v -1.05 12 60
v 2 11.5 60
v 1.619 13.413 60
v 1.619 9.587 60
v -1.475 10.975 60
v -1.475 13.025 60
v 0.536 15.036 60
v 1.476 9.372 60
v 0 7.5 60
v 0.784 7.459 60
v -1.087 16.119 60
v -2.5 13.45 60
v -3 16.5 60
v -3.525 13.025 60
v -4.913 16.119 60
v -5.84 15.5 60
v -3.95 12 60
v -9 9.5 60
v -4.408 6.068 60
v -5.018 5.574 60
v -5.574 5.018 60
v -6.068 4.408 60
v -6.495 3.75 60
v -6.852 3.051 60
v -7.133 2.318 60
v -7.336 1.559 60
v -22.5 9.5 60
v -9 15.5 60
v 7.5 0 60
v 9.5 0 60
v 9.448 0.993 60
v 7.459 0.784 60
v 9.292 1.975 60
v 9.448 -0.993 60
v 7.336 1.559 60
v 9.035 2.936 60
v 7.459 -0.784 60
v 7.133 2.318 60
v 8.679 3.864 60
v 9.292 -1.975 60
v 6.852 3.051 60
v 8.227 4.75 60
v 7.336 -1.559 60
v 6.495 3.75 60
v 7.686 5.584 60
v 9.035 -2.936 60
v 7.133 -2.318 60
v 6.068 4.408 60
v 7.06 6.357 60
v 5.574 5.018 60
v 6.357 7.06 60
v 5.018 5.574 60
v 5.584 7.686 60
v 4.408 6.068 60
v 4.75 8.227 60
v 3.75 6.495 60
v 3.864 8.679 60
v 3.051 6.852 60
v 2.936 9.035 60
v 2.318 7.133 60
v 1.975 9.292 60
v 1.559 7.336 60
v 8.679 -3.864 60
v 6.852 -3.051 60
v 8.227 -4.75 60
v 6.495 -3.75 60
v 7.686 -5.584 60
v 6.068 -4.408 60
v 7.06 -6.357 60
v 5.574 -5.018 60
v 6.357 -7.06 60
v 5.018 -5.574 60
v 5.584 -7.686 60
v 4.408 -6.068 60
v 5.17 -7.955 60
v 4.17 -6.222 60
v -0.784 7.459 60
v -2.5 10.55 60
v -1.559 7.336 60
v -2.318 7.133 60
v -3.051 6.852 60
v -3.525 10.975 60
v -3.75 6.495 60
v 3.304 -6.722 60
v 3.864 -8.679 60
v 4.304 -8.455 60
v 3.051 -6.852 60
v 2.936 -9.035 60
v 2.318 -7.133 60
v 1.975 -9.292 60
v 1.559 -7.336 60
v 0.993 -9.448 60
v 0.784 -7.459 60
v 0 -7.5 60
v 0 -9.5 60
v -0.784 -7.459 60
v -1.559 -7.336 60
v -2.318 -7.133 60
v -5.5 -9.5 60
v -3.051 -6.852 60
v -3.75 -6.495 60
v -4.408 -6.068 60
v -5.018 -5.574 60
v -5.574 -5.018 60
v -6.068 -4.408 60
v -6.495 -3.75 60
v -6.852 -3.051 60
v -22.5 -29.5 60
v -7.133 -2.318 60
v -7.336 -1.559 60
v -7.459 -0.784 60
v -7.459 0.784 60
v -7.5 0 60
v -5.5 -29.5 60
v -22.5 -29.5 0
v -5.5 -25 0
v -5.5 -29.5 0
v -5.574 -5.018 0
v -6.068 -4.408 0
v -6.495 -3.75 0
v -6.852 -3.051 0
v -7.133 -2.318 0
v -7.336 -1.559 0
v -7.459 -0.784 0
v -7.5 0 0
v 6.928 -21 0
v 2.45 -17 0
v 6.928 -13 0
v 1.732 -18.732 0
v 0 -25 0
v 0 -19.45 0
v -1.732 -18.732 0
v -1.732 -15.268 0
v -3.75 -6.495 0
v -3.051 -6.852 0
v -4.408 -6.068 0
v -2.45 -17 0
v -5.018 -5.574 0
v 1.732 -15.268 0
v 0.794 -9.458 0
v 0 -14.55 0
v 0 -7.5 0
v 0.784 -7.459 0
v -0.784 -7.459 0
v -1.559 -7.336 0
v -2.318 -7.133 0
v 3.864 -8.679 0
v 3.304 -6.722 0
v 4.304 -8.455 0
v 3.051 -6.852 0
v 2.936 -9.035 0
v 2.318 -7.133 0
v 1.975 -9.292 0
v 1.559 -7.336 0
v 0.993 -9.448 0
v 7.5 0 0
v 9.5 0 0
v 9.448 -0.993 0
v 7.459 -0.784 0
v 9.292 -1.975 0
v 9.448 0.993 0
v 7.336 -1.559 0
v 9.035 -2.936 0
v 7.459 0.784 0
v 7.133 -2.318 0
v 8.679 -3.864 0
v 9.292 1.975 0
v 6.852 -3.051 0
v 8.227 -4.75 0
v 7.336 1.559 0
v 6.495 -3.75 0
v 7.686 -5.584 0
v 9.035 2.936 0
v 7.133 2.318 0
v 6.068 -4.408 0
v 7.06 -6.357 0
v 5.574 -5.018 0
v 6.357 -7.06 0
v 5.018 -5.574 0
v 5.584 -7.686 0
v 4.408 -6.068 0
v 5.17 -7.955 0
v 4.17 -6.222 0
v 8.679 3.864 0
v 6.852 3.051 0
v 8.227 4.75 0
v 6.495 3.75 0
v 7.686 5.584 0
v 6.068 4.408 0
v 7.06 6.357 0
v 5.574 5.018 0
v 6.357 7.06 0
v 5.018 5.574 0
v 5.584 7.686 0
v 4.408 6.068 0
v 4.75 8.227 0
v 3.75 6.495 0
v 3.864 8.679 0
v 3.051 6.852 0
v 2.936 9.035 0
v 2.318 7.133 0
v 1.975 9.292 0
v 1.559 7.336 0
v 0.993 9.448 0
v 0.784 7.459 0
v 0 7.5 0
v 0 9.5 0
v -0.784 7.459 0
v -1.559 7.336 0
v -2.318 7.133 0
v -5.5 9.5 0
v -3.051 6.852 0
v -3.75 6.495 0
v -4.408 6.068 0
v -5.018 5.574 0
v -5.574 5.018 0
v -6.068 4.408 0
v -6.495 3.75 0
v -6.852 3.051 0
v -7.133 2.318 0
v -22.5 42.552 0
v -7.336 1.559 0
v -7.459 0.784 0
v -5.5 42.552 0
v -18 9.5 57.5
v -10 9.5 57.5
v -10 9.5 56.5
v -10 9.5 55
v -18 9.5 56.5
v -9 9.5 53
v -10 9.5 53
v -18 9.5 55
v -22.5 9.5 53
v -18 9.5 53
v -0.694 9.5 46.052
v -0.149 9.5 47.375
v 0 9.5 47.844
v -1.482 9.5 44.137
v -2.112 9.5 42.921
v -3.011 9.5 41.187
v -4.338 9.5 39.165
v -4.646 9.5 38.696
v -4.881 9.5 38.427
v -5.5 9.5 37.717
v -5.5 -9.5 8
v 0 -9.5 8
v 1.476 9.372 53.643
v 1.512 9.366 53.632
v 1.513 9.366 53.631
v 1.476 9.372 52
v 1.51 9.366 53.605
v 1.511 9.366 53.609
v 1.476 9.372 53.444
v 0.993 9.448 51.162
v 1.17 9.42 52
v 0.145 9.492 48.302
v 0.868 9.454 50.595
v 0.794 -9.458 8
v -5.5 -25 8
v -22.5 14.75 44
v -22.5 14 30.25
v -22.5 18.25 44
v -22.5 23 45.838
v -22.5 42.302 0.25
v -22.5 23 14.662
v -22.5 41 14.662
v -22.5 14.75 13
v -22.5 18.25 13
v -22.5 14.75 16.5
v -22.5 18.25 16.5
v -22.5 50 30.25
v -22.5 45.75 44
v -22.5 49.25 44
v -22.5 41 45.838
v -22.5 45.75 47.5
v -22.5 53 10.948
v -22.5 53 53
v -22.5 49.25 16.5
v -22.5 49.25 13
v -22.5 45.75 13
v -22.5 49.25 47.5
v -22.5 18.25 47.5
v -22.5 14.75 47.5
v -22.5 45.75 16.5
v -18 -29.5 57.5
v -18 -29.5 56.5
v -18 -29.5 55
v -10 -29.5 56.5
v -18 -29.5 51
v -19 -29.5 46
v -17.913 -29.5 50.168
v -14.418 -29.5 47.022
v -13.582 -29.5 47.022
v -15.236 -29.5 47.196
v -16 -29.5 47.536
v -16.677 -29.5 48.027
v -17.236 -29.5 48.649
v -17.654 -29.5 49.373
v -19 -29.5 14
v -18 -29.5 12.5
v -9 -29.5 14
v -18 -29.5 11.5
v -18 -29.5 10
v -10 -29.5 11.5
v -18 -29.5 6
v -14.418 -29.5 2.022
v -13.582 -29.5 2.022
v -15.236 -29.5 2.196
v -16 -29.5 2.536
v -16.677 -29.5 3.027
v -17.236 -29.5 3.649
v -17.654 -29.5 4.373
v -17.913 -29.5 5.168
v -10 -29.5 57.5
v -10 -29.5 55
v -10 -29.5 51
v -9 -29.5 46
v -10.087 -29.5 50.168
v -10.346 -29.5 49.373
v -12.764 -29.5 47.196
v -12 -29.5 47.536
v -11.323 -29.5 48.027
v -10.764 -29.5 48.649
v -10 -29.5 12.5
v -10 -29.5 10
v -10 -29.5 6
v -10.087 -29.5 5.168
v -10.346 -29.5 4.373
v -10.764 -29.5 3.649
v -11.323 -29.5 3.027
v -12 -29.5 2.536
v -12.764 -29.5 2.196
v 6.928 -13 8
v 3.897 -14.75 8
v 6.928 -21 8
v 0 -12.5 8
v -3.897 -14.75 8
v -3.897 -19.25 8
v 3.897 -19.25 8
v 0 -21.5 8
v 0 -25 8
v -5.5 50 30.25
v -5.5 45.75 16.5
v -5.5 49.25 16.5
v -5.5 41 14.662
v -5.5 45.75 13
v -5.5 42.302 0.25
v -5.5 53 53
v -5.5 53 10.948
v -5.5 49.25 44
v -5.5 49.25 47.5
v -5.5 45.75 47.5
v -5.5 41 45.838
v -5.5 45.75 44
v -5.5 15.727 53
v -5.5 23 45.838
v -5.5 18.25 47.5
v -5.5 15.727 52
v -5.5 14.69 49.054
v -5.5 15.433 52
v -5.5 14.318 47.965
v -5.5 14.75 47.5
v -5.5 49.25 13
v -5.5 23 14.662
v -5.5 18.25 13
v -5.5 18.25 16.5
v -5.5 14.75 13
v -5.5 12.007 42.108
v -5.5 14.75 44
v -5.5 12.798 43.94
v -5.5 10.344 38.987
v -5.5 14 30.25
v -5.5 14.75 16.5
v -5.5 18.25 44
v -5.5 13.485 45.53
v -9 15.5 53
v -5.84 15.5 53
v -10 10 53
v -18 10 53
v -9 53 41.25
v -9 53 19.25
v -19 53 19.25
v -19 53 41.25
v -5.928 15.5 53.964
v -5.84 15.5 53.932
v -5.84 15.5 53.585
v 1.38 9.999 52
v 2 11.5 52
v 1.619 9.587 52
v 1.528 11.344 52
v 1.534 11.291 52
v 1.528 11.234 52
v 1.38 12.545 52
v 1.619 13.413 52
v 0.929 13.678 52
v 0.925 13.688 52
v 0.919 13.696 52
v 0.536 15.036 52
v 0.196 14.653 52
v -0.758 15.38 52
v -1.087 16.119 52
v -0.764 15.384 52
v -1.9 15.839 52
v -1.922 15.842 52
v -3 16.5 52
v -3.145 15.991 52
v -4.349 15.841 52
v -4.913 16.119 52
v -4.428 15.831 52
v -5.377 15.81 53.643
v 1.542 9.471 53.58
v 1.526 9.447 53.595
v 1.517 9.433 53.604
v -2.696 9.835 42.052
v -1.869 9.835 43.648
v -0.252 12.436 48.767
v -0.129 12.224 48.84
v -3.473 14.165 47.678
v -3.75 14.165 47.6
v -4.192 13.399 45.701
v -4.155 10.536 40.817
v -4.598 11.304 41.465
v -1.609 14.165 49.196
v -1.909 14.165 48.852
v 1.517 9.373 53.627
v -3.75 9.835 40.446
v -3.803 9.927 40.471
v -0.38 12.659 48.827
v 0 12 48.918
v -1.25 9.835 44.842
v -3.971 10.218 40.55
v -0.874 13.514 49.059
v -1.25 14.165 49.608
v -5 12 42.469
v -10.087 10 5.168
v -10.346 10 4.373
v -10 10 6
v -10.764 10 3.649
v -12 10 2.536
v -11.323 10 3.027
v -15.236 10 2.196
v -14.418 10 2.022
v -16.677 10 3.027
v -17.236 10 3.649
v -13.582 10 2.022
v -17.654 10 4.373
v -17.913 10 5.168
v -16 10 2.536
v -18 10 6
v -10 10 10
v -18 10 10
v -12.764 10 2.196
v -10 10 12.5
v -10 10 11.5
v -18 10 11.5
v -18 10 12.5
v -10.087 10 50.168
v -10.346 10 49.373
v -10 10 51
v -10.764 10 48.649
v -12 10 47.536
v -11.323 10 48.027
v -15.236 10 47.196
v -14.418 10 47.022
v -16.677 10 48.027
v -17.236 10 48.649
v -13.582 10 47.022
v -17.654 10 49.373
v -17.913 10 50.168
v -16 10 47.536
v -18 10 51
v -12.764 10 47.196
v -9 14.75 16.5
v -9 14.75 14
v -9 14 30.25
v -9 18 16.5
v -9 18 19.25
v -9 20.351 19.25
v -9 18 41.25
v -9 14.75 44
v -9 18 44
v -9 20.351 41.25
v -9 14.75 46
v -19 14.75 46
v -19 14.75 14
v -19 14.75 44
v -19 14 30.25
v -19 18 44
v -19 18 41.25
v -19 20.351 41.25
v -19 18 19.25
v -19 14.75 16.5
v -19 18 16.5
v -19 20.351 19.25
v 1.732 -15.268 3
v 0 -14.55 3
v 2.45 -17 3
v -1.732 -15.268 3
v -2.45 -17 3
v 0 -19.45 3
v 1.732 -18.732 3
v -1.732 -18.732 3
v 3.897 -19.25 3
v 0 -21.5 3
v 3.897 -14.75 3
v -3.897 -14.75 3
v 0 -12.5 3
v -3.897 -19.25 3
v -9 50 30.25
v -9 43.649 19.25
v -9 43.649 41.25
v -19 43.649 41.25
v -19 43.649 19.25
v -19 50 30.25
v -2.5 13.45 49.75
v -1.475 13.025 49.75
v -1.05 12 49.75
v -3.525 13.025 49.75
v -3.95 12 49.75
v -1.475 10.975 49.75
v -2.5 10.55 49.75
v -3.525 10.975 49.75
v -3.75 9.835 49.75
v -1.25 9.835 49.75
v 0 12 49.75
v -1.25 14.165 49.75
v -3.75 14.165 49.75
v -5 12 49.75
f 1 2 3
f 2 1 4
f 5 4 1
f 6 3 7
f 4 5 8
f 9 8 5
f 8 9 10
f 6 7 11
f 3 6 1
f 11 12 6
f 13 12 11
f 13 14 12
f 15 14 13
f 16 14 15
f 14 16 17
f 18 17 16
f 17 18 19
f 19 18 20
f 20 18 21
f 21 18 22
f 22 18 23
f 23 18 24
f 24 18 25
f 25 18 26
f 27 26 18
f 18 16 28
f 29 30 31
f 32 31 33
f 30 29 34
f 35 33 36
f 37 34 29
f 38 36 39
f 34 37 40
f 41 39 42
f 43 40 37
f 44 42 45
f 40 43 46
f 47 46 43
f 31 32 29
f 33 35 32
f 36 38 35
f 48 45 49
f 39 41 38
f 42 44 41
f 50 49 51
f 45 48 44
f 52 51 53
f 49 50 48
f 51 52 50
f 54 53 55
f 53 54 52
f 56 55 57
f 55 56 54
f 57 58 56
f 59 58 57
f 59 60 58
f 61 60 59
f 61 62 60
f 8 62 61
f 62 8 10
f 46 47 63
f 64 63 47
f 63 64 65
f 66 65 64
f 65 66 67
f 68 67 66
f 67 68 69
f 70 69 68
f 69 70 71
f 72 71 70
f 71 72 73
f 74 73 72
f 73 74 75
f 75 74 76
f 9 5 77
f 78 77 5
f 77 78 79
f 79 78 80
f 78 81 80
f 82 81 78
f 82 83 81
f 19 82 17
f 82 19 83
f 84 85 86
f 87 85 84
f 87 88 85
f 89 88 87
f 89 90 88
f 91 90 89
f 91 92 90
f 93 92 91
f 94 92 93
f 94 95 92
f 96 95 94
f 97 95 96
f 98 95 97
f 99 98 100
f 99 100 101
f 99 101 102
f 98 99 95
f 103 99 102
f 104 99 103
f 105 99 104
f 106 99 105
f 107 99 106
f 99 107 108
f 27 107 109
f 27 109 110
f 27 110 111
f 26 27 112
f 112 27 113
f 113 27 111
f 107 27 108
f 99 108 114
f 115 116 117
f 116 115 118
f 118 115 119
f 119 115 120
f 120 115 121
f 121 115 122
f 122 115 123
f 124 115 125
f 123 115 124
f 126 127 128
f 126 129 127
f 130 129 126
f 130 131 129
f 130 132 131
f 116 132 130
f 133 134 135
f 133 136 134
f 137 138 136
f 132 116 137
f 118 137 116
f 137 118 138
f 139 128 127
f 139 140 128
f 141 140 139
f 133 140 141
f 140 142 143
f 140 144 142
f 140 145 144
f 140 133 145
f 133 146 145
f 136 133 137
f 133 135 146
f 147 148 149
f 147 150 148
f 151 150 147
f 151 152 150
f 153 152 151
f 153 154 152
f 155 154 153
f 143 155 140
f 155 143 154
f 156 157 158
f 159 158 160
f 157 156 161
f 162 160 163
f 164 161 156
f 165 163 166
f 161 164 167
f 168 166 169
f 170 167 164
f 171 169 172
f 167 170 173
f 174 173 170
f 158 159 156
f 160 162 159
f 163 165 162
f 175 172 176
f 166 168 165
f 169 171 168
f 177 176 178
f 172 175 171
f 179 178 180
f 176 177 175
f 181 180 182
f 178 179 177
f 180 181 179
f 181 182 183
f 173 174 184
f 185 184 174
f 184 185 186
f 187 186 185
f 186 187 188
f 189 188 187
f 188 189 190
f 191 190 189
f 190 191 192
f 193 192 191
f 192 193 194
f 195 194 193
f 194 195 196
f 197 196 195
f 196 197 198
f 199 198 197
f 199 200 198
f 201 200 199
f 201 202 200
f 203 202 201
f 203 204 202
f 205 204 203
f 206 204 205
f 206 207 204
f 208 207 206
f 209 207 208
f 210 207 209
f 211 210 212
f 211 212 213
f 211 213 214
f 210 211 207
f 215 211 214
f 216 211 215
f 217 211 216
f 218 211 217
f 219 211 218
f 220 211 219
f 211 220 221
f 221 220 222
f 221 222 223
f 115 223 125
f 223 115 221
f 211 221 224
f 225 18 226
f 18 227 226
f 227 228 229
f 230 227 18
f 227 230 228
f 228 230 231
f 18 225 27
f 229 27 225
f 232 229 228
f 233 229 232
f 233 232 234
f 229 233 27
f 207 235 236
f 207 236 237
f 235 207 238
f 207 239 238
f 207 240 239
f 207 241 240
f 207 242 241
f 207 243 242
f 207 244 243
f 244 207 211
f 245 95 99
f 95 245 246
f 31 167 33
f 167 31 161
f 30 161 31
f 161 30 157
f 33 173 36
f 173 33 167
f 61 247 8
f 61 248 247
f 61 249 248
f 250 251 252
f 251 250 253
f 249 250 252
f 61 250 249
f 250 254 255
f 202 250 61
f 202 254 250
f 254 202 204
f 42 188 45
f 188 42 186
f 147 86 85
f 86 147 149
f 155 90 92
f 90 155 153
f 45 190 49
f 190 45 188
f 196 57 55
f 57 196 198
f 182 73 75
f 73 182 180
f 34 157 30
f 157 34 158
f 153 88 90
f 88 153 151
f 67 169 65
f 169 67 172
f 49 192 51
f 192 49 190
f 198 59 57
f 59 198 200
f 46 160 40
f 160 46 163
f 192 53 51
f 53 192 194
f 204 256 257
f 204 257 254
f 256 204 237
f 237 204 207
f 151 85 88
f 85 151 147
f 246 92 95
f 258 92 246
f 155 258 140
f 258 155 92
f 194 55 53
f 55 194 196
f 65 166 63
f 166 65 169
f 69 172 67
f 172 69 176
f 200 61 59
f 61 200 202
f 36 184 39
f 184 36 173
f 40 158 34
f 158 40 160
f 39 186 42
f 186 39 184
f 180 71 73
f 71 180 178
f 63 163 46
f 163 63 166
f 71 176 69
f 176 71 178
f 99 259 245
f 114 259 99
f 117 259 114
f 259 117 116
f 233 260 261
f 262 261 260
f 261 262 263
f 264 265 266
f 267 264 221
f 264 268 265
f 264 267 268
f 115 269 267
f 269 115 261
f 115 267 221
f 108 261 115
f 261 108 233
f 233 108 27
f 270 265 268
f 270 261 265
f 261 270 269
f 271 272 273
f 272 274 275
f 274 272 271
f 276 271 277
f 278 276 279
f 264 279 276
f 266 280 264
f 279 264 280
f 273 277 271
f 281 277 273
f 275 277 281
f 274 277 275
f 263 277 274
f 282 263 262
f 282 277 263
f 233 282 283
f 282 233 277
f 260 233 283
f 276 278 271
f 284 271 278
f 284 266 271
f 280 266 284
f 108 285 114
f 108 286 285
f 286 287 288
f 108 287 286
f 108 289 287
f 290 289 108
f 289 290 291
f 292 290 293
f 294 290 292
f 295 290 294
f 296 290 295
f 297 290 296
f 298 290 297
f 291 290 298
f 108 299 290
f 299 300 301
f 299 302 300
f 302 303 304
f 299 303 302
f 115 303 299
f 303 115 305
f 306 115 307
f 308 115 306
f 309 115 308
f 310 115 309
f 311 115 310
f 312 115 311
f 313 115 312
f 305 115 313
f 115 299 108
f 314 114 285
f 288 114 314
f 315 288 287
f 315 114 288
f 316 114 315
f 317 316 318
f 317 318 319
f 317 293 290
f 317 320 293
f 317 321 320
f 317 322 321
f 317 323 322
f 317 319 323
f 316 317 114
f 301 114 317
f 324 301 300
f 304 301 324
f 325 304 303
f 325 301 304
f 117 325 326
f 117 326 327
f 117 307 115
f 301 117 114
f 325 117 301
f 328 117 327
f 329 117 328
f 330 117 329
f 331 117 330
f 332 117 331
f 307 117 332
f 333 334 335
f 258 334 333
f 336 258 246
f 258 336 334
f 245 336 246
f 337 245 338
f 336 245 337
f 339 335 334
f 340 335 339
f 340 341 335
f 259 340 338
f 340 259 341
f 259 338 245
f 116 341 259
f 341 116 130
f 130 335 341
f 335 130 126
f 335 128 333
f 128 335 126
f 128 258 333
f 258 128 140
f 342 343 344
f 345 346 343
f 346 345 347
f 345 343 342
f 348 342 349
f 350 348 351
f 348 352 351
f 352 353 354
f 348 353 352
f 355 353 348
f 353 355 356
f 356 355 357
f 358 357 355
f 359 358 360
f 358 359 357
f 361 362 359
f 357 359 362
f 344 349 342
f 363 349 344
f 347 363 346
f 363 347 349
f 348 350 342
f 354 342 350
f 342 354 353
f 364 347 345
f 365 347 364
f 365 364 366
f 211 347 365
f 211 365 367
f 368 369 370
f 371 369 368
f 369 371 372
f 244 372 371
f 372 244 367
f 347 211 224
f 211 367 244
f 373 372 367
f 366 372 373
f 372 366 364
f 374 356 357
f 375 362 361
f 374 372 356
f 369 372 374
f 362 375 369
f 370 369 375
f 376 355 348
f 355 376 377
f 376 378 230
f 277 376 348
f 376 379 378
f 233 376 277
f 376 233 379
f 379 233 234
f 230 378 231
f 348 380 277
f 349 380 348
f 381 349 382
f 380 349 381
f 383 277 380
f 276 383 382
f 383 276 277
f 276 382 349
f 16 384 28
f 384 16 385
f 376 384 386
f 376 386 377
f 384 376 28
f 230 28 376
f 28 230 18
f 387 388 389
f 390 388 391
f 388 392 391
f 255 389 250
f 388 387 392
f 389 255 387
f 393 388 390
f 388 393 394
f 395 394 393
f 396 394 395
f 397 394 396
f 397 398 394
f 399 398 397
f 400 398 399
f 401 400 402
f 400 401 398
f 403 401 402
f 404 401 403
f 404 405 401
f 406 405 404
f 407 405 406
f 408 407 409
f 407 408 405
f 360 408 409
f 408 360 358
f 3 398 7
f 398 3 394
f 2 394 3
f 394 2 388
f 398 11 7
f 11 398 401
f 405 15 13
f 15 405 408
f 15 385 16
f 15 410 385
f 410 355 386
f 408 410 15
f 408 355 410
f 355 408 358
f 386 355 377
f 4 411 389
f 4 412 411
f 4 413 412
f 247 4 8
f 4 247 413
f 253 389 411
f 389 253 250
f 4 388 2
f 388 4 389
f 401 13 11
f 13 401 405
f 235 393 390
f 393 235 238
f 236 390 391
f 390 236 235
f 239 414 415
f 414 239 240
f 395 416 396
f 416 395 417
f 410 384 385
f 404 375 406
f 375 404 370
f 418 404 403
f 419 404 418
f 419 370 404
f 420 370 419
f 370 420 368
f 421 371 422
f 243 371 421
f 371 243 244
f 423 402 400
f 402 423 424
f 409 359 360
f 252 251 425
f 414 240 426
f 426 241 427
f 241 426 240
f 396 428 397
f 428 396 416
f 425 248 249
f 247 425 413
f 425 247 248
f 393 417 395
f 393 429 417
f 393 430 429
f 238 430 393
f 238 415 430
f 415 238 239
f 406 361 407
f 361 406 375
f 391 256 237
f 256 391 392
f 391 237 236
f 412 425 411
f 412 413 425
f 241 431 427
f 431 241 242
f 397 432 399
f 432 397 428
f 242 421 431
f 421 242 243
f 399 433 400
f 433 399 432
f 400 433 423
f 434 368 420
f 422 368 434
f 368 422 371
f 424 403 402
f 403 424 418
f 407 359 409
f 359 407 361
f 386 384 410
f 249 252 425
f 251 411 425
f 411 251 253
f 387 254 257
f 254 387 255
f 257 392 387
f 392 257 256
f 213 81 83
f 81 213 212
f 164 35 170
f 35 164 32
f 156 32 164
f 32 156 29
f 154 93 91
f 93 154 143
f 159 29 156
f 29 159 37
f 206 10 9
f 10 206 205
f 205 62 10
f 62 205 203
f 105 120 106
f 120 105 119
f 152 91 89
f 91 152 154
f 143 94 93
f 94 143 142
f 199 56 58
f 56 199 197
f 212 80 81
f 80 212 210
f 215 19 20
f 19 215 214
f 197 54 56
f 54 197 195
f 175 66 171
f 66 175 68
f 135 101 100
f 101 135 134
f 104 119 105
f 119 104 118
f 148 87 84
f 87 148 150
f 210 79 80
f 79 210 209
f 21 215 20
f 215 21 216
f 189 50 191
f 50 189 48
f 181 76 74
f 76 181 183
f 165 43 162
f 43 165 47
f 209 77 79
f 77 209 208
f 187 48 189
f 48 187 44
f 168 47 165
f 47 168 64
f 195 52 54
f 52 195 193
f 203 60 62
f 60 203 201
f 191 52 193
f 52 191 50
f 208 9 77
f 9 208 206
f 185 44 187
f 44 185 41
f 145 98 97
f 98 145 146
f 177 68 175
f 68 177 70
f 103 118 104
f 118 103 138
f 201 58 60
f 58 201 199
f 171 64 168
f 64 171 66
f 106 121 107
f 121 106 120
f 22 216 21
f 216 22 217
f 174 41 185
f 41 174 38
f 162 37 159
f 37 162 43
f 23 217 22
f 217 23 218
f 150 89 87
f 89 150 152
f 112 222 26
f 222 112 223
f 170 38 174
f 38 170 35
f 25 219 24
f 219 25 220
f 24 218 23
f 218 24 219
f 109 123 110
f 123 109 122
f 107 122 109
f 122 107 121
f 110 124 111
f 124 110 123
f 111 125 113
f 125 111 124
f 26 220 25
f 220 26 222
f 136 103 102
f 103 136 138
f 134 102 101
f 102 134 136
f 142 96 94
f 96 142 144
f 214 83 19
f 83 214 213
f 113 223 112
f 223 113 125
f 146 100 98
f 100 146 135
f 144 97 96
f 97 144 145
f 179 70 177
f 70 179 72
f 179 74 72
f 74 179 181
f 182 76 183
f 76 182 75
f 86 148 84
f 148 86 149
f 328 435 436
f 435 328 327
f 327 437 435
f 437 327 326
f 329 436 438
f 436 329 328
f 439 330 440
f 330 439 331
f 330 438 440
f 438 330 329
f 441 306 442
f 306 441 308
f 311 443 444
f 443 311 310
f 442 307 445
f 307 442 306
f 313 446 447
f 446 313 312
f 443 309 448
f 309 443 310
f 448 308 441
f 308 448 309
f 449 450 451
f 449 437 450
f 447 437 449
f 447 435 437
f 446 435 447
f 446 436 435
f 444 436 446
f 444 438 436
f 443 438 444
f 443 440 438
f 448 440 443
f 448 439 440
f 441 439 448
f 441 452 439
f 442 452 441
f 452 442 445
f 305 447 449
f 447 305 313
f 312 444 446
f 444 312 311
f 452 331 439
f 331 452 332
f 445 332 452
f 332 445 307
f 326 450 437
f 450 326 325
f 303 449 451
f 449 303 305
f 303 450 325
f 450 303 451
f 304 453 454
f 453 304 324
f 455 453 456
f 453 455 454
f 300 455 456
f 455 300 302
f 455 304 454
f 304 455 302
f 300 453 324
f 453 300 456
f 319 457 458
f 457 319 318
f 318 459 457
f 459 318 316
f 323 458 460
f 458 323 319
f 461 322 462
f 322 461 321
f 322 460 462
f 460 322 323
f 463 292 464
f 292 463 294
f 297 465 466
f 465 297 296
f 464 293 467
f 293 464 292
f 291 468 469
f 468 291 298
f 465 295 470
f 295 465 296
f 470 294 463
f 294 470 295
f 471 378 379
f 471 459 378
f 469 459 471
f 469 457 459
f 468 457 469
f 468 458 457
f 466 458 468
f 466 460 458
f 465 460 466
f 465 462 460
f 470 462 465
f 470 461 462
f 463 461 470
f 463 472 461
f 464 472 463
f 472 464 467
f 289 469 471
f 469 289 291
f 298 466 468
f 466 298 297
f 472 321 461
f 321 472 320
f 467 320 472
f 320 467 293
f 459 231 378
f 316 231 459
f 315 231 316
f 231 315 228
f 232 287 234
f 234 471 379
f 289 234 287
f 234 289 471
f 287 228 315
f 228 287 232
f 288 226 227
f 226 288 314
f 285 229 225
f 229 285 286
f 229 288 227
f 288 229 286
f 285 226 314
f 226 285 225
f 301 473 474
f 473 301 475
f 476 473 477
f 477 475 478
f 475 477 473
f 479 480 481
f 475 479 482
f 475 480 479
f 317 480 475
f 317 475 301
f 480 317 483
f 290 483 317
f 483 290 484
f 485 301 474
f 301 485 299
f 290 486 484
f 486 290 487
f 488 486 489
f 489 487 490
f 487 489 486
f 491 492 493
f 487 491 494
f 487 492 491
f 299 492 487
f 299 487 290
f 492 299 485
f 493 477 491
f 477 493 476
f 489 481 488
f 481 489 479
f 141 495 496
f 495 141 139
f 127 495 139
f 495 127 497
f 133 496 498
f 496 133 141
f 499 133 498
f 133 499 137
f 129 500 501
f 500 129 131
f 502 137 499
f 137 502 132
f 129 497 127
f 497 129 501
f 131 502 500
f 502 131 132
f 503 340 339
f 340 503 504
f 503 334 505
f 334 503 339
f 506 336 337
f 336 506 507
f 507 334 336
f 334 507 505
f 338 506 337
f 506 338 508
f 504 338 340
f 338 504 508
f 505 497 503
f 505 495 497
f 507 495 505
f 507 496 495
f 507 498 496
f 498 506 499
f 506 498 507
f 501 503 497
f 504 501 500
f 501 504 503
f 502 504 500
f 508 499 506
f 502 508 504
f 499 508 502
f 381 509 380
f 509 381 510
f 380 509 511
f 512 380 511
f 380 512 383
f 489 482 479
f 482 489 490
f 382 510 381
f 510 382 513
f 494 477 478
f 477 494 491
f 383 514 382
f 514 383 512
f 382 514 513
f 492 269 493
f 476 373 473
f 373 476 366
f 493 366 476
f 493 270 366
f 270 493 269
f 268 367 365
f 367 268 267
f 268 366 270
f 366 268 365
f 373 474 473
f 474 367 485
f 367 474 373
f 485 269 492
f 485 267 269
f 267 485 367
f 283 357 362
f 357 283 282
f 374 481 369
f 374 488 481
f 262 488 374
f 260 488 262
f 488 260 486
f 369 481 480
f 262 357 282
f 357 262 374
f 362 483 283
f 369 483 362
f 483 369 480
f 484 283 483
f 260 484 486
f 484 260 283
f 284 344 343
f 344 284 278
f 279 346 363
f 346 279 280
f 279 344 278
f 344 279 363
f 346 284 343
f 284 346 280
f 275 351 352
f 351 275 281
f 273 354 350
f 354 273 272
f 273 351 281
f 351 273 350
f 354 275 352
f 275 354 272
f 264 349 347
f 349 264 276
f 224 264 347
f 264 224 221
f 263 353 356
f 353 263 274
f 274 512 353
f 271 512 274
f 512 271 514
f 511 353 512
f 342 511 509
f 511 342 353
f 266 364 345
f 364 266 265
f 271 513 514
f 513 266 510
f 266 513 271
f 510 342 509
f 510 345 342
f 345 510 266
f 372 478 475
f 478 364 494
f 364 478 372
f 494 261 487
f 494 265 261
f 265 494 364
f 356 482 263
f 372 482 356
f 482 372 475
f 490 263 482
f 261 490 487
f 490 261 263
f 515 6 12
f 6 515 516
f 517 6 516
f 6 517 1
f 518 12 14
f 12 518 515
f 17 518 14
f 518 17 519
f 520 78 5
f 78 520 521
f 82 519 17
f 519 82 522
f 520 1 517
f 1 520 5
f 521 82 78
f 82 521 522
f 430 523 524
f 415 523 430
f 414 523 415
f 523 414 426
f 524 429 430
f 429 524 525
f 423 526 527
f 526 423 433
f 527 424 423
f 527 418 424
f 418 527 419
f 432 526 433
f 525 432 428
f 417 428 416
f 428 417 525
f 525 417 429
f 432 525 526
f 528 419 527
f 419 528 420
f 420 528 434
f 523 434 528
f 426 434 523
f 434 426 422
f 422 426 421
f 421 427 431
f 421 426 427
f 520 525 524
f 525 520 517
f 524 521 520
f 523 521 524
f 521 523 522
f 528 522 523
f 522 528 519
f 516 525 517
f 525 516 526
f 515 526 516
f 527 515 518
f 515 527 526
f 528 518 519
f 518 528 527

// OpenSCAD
// file: bearing.scad
// PRUSA iteration3
// Bearing holders
// GNU GPL v3
// Josef Průša <iam@josefprusa.cz> and contributors
// http://www.reprap.org/wiki/Prusa_Mendel
// http://prusamendel.org

//LM8UU
bearing_diameter = 15;
bearing_long = 24;
bearing_in = 8;

module horizontal_bearing_base(bearings=1){
 translate(v=[0,0,6]) cube(size = [24,8+bearings*bearing_long,12], center = true);	
}
module horizontal_bearing_holes(bearings=1){
 cutter_lenght = 10+bearings*bearing_long;
 one_holder_lenght = 8+bearing_long;
 holder_lenght = 8+bearings*bearing_long;
 
 // Main bearing cut
 difference(){
  translate(v=[0,0,12]) rotate(a=[90,0,0]) translate(v=[0,0,-cutter_lenght/2]) cylinder(h = cutter_lenght, r=bearing_diameter/2, $fn=50);
  // Bearing retainers
  translate(v=[0,1-holder_lenght/2,3]) cube(size = [24,6,2+(bearing_diameter-bearing_in)/2], center = true);
  translate(v=[0,-1+holder_lenght/2,3]) cube(size = [24,6,2+(bearing_diameter-bearing_in)/2], center = true);
 }
 
 // Ziptie cutouts
 ziptie_cut_ofset = 0;
 for ( i = [0 : bearings-1] ){
  // For easier positioning I move them by half of one 
  // bearing holder then add each bearign lenght and then center again
  translate(v=[0,-holder_lenght/2,0]) translate(v=[0,one_holder_lenght/2+i*25,0]) difference(){
   union(){
    translate(v=[0,2-6,12]) rotate(a=[90,0,0]) translate(v=[0,0,0]) cylinder(h = 4, r=12.5, $fn=50);
    translate(v=[0,2+6,12]) rotate(a=[90,0,0]) translate(v=[0,0,0]) cylinder(h = 4, r=12.5, $fn=50);
   }
   translate(v=[0,10,12]) rotate(a=[90,0,0]) translate(v=[0,0,0]) cylinder(h = 24, r=10, $fn=50);
  }
 }
 
}

module horizontal_bearing_test(){
 difference(){
  horizontal_bearing_base(1);
  horizontal_bearing_holes(1);
 }
 translate(v=[30,0,0]) difference(){
  horizontal_bearing_base(2);
  horizontal_bearing_holes(2);
 }
 translate(v=[60,0,0]) difference(){
  horizontal_bearing_base(3);
  horizontal_bearing_holes(3);
 }
}



thinwall = 2;
bearing_size = bearing_diameter + 2 * thinwall;

module vertical_bearing_base(){
 translate(v=[-2-bearing_size/4,0,30]) cube(size = [4+bearing_size/2,bearing_size,60], center = true);
 cylinder(h = 60, r=bearing_size/2, $fn = 60);
}

module vertical_bearing_holes(){
  translate(v=[0,0,-1]) cylinder(h = 62, r=bearing_diameter/2, $fn = 60);
  rotate(a=[0,0,-60]) translate(v=[10,0,31]) cube(size = [10,1,62], center = true);
}

difference(){
vertical_bearing_base();
vertical_bearing_holes();
}
// file: configuration.scad
x_rod_distance = 45;

// Select your belt type ******************************************************

//GT2
belt_tooth_distance = 2;
belt_tooth_ratio = 0.64;

//T2.5
//belt_tooth_distance = 2.5;
//belt_tooth_ratio = 0.5;

//T5 (strongly discouraged)
//belt_tooth_distance = 5;
//belt_tooth_ratio = 0.75;

//HTD3
//belt_tooth_distance = 3;
//belt_tooth_ratio = 0.75;

//MXL
//belt_tooth_distance = 2.032;
//belt_tooth_ratio = 0.64;

// Select your hot-end mount ******************************************************

// 0 = none; 1 = groove-mount (J-head/MakerGear etc.)
hotend_mount = 1;

hotend_groovemount_depth = 5;
hotend_groovemount_diameter = 16;
// file: x-end.scad
// PRUSA iteration3
// X end prototype
// GNU GPL v3
// Josef Průša <iam@josefprusa.cz> and contributors
// http://www.reprap.org/wiki/Prusa_Mendel
// http://prusamendel.org

include <configuration.scad>
use <bearing.scad>

module x_end_base(){
// Main block
translate(v=[-14,-10,30]) cube(size = [17,39,60], center = true);
// Bearing holder
vertical_bearing_base();	
//Nut trap
 // Cube
 translate(v=[-2-2,-17,4]) cube(size = [8,16,8], center = true);
 // Hexagon
 translate(v=[0,-17,0]) rotate([0,0,30]) cylinder(h = 8, r=8, $fn = 6);
}

module x_end_holes(){
vertical_bearing_holes();
// Belt hole
translate(v=[-5.5-10+1.5,-10,30]) cube(size = [10,56,32], center = true);
// Bottom pushfit rod
translate(v=[-14,-40,6]) rotate(a=[-90,0,0]) pushfit_rod(8,50);
// Top pushfit rod
translate(v=[-14,-40,x_rod_distance+6]) rotate(a=[-90,0,0]) pushfit_rod(8,50);
// Nut trap
 translate(v=[0,-17,-1]) cylinder(h = 10, r=2.45);
 translate(v=[0,-17,3]) rotate([0,0,30]) cylinder(h = 5, r=4.5, $fn = 6);
}


// Final prototype
module x_end_plain(){
 difference(){
  x_end_base();
  x_end_holes();
 }
}

x_end_plain();


module pushfit_rod(diameter,length){
 cylinder(h = length, r=diameter/2, $fn=30);
 translate(v=[0,-diameter/4,length/2]) cube(size = [diameter,diameter/2,length], center = true);
 translate(v=[0,-diameter/2-2,length/2]) cube(size = [diameter,1,length], center = true);
}
// main file
// PRUSA iteration3
// X end motor
// GNU GPL v3
// Josef Průša <iam@josefprusa.cz> and contributors
// http://www.reprap.org/wiki/Prusa_Mendel
// http://prusamendel.org

use <x-end.scad>

module x_end_motor_base(){
 x_end_base();
 translate(v=[-14,31,26.5]) cube(size = [17,44,53], center = true);
 //%translate(v=[0,31,26.5]) cube(size = [17,44,53], center = true);
//Nut trap
 // Cube
 translate(v=[-5,12,56]) rotate([0,0,90]) cube(size = [7,8,8], center = true);
 // Hexagon
 translate(v=[-3,11.5,52]) rotate([0,0,0]) cylinder(h = 8, r=5, $fn = 16);
 //soporte
 translate(v=[-8.7,5.4,38.5]) rotate([-20,20,0]) cylinder(h = 18, r=5, $fn = 26);
}

module x_end_motor_holes(){
 x_end_holes();
 // Position to place
 translate(v=[-0,32,30.25]){
  // Belt hole
  translate(v=[-14,1,0]) cube(size = [10,46,22], center = true);
  // Motor mounting holes
  translate(v=[-10,-15.5,-15.5]) cube(size = [60,3.5,3.5], center = true);
  translate(v=[-10,-15.5,15.5]) cube(size = [60,3.5,3.5], center = true);
  translate(v=[-10,15.5,-15.5]) cube(size = [60,3.5,3.5], center = true);
  translate(v=[-10,15.5,15.5]) cube(size = [60,3.5,3.5], center = true);
  // Material saving cutout
  translate(v=[-10,40,-30]) rotate(a=[45,0,0])  cube(size = [60,42,42], center = true);
  // Motor shaft cutout
  translate(v=[0,0,0]) rotate(a=[0,-90,0]) rotate(a=[0,0,90]) cylinder(h = 80, r=18, $fn=6);
// Nut trap
 translate(v=[-2.5,-20,1]) cylinder(h = 30, r=1.45, $fn = 8);
 translate(v=[-2.5,-20,4.5]) rotate([0,0,0]) cylinder(h = 15, r=2.5, $fn = 6);
 }
}

// Final part
module x_end_motor(){
 difference(){
  x_end_motor_base();
  x_end_motor_holes();
 }
}

x_end_motor();
